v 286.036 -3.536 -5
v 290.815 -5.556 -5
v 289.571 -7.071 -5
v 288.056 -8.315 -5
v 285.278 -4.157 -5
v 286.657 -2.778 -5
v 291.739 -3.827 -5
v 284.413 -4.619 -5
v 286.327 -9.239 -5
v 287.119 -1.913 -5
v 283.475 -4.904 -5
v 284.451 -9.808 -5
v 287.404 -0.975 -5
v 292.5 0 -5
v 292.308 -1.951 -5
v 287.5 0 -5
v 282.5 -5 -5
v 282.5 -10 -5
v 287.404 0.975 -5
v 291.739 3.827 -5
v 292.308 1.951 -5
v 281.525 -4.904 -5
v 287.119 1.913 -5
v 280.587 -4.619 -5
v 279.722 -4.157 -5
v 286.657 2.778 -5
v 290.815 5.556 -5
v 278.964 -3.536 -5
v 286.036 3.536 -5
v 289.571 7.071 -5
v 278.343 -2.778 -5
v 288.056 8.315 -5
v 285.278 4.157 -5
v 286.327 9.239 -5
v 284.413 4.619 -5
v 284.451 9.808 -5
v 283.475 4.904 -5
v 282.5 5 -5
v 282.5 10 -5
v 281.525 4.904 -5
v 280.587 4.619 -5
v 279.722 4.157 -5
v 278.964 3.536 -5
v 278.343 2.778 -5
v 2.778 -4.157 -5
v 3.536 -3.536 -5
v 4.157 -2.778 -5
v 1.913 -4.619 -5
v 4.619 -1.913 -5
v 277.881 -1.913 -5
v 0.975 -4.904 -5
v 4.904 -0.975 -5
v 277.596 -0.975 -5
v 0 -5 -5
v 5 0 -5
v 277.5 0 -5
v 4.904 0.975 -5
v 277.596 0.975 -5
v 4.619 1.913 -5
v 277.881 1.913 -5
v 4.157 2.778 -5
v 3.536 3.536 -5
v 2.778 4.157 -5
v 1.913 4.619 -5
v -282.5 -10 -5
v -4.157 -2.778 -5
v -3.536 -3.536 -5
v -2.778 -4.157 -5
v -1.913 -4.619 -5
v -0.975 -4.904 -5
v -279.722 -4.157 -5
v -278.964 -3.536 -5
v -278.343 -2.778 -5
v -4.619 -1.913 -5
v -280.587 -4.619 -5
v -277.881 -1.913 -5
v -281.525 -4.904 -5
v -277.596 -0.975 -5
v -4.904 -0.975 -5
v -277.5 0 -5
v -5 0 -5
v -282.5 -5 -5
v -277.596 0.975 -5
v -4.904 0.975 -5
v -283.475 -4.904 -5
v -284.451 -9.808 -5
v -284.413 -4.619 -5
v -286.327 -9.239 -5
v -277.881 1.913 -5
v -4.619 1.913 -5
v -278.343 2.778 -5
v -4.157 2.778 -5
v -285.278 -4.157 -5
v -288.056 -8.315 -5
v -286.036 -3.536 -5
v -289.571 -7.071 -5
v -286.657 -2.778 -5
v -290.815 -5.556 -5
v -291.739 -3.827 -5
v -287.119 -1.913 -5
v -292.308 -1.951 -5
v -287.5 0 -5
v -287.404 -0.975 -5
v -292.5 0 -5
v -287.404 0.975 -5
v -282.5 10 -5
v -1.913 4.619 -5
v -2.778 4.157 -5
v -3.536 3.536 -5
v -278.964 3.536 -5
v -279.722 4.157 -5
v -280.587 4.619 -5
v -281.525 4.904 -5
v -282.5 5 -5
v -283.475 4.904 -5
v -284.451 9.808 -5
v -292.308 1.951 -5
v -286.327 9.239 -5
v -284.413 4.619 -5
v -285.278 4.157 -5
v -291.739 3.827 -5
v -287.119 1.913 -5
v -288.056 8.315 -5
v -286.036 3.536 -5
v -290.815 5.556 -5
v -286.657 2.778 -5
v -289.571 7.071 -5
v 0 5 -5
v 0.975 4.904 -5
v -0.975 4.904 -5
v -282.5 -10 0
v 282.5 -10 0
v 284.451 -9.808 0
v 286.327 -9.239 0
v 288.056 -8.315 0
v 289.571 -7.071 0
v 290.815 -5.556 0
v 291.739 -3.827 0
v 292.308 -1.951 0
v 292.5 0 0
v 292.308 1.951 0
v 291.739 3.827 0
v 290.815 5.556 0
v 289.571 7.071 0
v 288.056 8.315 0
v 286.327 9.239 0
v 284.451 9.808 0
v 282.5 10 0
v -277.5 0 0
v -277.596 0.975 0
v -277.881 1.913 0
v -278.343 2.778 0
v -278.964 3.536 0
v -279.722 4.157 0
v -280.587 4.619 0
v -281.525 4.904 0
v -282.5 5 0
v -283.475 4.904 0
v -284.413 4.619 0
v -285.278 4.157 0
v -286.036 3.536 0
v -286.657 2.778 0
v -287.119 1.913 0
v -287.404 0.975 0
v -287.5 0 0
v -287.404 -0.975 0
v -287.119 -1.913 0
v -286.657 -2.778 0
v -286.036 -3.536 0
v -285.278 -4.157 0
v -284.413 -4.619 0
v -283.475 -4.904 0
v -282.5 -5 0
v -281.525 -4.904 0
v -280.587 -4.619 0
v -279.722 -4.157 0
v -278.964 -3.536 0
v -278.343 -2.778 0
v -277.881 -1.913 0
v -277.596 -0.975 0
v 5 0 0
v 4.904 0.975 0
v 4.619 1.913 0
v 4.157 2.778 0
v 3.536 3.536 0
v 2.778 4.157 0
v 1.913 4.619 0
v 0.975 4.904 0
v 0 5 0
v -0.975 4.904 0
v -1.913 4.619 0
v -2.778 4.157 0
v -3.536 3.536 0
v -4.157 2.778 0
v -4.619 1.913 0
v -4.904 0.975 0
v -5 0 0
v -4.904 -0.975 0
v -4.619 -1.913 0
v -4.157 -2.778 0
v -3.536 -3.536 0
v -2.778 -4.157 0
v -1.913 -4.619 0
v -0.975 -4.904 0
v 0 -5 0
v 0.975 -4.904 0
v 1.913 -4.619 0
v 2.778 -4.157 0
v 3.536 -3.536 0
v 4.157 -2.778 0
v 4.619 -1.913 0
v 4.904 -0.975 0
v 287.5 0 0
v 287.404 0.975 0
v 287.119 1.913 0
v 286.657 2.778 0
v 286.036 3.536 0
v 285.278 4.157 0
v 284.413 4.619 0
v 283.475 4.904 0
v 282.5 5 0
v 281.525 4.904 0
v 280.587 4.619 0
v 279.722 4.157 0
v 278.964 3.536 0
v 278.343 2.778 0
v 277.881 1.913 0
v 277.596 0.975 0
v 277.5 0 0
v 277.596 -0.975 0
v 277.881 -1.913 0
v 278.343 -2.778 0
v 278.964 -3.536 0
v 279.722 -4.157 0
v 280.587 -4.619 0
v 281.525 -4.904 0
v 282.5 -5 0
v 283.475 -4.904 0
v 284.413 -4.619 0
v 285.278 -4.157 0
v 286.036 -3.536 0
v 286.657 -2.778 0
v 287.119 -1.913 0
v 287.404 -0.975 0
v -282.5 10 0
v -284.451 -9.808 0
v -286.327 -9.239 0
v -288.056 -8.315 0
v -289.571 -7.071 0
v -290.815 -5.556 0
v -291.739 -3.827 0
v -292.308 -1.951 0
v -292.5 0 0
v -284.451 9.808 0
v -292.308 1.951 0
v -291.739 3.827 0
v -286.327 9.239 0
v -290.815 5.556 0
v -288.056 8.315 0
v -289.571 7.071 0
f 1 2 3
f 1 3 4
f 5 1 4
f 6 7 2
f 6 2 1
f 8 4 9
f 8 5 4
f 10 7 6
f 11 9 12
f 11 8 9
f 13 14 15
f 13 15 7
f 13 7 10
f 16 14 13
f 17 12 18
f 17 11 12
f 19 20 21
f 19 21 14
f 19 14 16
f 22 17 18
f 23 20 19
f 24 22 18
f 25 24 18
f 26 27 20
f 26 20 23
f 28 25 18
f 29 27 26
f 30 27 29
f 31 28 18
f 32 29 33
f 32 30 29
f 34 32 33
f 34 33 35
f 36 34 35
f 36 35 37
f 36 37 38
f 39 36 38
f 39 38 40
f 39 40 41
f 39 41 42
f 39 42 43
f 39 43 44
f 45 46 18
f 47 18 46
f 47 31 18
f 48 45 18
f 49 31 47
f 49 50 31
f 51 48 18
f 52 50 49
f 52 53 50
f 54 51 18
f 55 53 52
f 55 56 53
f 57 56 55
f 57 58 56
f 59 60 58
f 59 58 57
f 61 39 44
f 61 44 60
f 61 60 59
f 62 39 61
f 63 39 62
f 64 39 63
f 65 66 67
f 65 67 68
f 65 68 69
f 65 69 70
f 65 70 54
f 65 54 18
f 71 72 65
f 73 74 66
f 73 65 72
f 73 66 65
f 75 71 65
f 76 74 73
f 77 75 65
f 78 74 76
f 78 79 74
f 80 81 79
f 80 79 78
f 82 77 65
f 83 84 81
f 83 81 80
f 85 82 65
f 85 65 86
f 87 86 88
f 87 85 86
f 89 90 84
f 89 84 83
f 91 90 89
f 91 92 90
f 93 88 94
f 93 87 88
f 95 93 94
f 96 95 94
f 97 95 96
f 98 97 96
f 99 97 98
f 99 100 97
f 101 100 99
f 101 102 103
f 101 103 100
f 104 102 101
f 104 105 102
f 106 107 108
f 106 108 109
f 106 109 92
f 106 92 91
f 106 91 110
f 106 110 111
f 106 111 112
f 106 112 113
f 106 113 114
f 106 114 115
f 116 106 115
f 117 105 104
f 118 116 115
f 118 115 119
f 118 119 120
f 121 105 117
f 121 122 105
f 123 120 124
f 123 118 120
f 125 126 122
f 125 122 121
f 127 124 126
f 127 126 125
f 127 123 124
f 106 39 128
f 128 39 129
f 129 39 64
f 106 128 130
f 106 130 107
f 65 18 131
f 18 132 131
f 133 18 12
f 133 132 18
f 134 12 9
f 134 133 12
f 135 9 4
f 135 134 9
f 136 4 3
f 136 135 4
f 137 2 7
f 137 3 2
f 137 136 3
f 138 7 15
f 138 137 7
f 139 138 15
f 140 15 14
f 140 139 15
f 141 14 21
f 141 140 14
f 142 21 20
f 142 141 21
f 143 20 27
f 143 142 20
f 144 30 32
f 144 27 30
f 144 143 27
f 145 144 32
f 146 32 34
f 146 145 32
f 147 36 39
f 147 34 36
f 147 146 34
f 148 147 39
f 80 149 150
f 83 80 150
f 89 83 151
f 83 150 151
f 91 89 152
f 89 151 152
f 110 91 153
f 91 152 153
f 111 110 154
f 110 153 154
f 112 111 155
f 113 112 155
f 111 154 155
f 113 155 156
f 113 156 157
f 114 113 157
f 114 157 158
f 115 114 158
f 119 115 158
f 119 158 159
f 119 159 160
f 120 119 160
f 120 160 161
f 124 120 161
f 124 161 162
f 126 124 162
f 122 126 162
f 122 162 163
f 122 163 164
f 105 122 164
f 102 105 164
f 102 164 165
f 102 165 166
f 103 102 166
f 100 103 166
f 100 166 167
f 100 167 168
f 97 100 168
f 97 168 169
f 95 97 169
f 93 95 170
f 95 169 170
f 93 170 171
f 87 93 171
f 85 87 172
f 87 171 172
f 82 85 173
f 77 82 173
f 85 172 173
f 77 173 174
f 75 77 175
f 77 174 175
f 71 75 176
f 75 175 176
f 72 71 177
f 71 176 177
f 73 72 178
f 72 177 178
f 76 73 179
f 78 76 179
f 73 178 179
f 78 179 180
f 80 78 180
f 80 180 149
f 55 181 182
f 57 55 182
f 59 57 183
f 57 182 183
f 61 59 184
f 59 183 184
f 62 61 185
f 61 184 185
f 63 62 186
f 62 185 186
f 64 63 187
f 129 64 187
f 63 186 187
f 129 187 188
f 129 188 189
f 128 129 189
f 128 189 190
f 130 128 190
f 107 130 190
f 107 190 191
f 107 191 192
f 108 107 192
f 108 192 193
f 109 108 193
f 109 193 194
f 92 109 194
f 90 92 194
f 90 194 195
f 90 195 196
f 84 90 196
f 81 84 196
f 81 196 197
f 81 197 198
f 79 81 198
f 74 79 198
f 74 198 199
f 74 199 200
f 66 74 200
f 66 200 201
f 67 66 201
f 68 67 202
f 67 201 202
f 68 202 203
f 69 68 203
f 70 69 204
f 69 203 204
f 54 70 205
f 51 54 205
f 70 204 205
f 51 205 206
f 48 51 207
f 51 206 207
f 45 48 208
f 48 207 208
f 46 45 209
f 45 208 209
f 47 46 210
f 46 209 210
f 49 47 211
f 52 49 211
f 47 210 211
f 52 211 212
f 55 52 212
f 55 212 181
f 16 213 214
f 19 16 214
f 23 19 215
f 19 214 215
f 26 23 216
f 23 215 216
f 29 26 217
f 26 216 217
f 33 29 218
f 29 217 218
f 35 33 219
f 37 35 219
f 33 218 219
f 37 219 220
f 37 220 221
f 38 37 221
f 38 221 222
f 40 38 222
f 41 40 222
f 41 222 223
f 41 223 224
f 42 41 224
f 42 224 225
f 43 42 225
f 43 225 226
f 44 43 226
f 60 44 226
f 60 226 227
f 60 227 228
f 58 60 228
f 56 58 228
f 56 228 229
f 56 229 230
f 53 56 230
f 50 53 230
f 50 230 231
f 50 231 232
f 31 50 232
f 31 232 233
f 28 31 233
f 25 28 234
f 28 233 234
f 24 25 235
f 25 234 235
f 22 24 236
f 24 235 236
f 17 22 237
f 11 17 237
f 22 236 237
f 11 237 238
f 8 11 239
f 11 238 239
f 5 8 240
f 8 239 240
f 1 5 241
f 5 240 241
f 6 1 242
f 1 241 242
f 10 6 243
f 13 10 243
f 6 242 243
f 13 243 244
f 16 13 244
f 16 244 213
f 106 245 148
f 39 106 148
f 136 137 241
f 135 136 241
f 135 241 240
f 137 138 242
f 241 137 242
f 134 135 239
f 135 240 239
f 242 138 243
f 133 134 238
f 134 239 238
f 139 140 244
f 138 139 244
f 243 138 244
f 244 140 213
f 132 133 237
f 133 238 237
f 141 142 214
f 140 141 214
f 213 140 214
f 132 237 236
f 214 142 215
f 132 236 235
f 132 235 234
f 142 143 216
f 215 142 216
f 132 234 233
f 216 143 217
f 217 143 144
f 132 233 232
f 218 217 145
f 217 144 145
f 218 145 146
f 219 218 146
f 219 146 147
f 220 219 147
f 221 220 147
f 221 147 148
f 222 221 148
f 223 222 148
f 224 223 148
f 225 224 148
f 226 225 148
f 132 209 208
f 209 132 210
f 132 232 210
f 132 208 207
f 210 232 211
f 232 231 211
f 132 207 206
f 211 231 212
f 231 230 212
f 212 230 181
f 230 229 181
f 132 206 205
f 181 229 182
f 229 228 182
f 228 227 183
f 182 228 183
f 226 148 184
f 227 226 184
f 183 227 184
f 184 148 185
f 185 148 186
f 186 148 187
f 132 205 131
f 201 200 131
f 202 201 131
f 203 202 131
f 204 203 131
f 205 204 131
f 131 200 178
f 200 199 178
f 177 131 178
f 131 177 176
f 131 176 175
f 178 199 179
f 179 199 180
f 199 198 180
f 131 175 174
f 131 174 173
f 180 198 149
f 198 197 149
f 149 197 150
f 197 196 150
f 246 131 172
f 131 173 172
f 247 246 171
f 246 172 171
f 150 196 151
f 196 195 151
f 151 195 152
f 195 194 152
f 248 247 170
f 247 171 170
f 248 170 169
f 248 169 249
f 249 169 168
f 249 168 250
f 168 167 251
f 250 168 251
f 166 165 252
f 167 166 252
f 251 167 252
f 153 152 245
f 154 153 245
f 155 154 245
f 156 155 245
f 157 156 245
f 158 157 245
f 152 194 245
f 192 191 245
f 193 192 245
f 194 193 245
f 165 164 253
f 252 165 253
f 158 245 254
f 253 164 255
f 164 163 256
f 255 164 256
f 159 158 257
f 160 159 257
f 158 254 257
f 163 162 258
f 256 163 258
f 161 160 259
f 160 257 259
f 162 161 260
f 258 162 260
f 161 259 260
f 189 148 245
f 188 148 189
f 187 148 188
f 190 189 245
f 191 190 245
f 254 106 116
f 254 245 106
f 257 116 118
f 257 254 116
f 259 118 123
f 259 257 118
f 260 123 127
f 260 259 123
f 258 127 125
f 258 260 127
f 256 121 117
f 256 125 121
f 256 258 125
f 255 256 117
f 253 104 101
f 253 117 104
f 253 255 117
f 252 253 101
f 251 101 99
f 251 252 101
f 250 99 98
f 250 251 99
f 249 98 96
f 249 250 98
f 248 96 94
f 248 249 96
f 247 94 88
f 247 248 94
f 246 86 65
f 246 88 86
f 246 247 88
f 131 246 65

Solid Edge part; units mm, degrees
sketch "Sketch1" plane through (0, 0, 0) normal (0, 0, 1) x (1, 0, 0)
  arc A0 (-282.5, -10) -> (-282.5, 10) centre (-282.5, 0) cw
  line L0 (-282.5, 10) -> (282.5, 10)
  arc A1 (282.5, 10) -> (282.5, -10) centre (282.5, 0) cw
  line L1 (282.5, -10) -> (-282.5, -10)
  circle A2 centre (-282.5, 0) radius 5
  circle A3 centre (282.5, 0) radius 5
  circle A4 centre (0, 0) radius 5
  dimension "D1" = 565
  dimension "D2" = 20
extrude "Protrusion1" add sketch "Sketch1" against normal blind 5
properties material "Stainless steel"
